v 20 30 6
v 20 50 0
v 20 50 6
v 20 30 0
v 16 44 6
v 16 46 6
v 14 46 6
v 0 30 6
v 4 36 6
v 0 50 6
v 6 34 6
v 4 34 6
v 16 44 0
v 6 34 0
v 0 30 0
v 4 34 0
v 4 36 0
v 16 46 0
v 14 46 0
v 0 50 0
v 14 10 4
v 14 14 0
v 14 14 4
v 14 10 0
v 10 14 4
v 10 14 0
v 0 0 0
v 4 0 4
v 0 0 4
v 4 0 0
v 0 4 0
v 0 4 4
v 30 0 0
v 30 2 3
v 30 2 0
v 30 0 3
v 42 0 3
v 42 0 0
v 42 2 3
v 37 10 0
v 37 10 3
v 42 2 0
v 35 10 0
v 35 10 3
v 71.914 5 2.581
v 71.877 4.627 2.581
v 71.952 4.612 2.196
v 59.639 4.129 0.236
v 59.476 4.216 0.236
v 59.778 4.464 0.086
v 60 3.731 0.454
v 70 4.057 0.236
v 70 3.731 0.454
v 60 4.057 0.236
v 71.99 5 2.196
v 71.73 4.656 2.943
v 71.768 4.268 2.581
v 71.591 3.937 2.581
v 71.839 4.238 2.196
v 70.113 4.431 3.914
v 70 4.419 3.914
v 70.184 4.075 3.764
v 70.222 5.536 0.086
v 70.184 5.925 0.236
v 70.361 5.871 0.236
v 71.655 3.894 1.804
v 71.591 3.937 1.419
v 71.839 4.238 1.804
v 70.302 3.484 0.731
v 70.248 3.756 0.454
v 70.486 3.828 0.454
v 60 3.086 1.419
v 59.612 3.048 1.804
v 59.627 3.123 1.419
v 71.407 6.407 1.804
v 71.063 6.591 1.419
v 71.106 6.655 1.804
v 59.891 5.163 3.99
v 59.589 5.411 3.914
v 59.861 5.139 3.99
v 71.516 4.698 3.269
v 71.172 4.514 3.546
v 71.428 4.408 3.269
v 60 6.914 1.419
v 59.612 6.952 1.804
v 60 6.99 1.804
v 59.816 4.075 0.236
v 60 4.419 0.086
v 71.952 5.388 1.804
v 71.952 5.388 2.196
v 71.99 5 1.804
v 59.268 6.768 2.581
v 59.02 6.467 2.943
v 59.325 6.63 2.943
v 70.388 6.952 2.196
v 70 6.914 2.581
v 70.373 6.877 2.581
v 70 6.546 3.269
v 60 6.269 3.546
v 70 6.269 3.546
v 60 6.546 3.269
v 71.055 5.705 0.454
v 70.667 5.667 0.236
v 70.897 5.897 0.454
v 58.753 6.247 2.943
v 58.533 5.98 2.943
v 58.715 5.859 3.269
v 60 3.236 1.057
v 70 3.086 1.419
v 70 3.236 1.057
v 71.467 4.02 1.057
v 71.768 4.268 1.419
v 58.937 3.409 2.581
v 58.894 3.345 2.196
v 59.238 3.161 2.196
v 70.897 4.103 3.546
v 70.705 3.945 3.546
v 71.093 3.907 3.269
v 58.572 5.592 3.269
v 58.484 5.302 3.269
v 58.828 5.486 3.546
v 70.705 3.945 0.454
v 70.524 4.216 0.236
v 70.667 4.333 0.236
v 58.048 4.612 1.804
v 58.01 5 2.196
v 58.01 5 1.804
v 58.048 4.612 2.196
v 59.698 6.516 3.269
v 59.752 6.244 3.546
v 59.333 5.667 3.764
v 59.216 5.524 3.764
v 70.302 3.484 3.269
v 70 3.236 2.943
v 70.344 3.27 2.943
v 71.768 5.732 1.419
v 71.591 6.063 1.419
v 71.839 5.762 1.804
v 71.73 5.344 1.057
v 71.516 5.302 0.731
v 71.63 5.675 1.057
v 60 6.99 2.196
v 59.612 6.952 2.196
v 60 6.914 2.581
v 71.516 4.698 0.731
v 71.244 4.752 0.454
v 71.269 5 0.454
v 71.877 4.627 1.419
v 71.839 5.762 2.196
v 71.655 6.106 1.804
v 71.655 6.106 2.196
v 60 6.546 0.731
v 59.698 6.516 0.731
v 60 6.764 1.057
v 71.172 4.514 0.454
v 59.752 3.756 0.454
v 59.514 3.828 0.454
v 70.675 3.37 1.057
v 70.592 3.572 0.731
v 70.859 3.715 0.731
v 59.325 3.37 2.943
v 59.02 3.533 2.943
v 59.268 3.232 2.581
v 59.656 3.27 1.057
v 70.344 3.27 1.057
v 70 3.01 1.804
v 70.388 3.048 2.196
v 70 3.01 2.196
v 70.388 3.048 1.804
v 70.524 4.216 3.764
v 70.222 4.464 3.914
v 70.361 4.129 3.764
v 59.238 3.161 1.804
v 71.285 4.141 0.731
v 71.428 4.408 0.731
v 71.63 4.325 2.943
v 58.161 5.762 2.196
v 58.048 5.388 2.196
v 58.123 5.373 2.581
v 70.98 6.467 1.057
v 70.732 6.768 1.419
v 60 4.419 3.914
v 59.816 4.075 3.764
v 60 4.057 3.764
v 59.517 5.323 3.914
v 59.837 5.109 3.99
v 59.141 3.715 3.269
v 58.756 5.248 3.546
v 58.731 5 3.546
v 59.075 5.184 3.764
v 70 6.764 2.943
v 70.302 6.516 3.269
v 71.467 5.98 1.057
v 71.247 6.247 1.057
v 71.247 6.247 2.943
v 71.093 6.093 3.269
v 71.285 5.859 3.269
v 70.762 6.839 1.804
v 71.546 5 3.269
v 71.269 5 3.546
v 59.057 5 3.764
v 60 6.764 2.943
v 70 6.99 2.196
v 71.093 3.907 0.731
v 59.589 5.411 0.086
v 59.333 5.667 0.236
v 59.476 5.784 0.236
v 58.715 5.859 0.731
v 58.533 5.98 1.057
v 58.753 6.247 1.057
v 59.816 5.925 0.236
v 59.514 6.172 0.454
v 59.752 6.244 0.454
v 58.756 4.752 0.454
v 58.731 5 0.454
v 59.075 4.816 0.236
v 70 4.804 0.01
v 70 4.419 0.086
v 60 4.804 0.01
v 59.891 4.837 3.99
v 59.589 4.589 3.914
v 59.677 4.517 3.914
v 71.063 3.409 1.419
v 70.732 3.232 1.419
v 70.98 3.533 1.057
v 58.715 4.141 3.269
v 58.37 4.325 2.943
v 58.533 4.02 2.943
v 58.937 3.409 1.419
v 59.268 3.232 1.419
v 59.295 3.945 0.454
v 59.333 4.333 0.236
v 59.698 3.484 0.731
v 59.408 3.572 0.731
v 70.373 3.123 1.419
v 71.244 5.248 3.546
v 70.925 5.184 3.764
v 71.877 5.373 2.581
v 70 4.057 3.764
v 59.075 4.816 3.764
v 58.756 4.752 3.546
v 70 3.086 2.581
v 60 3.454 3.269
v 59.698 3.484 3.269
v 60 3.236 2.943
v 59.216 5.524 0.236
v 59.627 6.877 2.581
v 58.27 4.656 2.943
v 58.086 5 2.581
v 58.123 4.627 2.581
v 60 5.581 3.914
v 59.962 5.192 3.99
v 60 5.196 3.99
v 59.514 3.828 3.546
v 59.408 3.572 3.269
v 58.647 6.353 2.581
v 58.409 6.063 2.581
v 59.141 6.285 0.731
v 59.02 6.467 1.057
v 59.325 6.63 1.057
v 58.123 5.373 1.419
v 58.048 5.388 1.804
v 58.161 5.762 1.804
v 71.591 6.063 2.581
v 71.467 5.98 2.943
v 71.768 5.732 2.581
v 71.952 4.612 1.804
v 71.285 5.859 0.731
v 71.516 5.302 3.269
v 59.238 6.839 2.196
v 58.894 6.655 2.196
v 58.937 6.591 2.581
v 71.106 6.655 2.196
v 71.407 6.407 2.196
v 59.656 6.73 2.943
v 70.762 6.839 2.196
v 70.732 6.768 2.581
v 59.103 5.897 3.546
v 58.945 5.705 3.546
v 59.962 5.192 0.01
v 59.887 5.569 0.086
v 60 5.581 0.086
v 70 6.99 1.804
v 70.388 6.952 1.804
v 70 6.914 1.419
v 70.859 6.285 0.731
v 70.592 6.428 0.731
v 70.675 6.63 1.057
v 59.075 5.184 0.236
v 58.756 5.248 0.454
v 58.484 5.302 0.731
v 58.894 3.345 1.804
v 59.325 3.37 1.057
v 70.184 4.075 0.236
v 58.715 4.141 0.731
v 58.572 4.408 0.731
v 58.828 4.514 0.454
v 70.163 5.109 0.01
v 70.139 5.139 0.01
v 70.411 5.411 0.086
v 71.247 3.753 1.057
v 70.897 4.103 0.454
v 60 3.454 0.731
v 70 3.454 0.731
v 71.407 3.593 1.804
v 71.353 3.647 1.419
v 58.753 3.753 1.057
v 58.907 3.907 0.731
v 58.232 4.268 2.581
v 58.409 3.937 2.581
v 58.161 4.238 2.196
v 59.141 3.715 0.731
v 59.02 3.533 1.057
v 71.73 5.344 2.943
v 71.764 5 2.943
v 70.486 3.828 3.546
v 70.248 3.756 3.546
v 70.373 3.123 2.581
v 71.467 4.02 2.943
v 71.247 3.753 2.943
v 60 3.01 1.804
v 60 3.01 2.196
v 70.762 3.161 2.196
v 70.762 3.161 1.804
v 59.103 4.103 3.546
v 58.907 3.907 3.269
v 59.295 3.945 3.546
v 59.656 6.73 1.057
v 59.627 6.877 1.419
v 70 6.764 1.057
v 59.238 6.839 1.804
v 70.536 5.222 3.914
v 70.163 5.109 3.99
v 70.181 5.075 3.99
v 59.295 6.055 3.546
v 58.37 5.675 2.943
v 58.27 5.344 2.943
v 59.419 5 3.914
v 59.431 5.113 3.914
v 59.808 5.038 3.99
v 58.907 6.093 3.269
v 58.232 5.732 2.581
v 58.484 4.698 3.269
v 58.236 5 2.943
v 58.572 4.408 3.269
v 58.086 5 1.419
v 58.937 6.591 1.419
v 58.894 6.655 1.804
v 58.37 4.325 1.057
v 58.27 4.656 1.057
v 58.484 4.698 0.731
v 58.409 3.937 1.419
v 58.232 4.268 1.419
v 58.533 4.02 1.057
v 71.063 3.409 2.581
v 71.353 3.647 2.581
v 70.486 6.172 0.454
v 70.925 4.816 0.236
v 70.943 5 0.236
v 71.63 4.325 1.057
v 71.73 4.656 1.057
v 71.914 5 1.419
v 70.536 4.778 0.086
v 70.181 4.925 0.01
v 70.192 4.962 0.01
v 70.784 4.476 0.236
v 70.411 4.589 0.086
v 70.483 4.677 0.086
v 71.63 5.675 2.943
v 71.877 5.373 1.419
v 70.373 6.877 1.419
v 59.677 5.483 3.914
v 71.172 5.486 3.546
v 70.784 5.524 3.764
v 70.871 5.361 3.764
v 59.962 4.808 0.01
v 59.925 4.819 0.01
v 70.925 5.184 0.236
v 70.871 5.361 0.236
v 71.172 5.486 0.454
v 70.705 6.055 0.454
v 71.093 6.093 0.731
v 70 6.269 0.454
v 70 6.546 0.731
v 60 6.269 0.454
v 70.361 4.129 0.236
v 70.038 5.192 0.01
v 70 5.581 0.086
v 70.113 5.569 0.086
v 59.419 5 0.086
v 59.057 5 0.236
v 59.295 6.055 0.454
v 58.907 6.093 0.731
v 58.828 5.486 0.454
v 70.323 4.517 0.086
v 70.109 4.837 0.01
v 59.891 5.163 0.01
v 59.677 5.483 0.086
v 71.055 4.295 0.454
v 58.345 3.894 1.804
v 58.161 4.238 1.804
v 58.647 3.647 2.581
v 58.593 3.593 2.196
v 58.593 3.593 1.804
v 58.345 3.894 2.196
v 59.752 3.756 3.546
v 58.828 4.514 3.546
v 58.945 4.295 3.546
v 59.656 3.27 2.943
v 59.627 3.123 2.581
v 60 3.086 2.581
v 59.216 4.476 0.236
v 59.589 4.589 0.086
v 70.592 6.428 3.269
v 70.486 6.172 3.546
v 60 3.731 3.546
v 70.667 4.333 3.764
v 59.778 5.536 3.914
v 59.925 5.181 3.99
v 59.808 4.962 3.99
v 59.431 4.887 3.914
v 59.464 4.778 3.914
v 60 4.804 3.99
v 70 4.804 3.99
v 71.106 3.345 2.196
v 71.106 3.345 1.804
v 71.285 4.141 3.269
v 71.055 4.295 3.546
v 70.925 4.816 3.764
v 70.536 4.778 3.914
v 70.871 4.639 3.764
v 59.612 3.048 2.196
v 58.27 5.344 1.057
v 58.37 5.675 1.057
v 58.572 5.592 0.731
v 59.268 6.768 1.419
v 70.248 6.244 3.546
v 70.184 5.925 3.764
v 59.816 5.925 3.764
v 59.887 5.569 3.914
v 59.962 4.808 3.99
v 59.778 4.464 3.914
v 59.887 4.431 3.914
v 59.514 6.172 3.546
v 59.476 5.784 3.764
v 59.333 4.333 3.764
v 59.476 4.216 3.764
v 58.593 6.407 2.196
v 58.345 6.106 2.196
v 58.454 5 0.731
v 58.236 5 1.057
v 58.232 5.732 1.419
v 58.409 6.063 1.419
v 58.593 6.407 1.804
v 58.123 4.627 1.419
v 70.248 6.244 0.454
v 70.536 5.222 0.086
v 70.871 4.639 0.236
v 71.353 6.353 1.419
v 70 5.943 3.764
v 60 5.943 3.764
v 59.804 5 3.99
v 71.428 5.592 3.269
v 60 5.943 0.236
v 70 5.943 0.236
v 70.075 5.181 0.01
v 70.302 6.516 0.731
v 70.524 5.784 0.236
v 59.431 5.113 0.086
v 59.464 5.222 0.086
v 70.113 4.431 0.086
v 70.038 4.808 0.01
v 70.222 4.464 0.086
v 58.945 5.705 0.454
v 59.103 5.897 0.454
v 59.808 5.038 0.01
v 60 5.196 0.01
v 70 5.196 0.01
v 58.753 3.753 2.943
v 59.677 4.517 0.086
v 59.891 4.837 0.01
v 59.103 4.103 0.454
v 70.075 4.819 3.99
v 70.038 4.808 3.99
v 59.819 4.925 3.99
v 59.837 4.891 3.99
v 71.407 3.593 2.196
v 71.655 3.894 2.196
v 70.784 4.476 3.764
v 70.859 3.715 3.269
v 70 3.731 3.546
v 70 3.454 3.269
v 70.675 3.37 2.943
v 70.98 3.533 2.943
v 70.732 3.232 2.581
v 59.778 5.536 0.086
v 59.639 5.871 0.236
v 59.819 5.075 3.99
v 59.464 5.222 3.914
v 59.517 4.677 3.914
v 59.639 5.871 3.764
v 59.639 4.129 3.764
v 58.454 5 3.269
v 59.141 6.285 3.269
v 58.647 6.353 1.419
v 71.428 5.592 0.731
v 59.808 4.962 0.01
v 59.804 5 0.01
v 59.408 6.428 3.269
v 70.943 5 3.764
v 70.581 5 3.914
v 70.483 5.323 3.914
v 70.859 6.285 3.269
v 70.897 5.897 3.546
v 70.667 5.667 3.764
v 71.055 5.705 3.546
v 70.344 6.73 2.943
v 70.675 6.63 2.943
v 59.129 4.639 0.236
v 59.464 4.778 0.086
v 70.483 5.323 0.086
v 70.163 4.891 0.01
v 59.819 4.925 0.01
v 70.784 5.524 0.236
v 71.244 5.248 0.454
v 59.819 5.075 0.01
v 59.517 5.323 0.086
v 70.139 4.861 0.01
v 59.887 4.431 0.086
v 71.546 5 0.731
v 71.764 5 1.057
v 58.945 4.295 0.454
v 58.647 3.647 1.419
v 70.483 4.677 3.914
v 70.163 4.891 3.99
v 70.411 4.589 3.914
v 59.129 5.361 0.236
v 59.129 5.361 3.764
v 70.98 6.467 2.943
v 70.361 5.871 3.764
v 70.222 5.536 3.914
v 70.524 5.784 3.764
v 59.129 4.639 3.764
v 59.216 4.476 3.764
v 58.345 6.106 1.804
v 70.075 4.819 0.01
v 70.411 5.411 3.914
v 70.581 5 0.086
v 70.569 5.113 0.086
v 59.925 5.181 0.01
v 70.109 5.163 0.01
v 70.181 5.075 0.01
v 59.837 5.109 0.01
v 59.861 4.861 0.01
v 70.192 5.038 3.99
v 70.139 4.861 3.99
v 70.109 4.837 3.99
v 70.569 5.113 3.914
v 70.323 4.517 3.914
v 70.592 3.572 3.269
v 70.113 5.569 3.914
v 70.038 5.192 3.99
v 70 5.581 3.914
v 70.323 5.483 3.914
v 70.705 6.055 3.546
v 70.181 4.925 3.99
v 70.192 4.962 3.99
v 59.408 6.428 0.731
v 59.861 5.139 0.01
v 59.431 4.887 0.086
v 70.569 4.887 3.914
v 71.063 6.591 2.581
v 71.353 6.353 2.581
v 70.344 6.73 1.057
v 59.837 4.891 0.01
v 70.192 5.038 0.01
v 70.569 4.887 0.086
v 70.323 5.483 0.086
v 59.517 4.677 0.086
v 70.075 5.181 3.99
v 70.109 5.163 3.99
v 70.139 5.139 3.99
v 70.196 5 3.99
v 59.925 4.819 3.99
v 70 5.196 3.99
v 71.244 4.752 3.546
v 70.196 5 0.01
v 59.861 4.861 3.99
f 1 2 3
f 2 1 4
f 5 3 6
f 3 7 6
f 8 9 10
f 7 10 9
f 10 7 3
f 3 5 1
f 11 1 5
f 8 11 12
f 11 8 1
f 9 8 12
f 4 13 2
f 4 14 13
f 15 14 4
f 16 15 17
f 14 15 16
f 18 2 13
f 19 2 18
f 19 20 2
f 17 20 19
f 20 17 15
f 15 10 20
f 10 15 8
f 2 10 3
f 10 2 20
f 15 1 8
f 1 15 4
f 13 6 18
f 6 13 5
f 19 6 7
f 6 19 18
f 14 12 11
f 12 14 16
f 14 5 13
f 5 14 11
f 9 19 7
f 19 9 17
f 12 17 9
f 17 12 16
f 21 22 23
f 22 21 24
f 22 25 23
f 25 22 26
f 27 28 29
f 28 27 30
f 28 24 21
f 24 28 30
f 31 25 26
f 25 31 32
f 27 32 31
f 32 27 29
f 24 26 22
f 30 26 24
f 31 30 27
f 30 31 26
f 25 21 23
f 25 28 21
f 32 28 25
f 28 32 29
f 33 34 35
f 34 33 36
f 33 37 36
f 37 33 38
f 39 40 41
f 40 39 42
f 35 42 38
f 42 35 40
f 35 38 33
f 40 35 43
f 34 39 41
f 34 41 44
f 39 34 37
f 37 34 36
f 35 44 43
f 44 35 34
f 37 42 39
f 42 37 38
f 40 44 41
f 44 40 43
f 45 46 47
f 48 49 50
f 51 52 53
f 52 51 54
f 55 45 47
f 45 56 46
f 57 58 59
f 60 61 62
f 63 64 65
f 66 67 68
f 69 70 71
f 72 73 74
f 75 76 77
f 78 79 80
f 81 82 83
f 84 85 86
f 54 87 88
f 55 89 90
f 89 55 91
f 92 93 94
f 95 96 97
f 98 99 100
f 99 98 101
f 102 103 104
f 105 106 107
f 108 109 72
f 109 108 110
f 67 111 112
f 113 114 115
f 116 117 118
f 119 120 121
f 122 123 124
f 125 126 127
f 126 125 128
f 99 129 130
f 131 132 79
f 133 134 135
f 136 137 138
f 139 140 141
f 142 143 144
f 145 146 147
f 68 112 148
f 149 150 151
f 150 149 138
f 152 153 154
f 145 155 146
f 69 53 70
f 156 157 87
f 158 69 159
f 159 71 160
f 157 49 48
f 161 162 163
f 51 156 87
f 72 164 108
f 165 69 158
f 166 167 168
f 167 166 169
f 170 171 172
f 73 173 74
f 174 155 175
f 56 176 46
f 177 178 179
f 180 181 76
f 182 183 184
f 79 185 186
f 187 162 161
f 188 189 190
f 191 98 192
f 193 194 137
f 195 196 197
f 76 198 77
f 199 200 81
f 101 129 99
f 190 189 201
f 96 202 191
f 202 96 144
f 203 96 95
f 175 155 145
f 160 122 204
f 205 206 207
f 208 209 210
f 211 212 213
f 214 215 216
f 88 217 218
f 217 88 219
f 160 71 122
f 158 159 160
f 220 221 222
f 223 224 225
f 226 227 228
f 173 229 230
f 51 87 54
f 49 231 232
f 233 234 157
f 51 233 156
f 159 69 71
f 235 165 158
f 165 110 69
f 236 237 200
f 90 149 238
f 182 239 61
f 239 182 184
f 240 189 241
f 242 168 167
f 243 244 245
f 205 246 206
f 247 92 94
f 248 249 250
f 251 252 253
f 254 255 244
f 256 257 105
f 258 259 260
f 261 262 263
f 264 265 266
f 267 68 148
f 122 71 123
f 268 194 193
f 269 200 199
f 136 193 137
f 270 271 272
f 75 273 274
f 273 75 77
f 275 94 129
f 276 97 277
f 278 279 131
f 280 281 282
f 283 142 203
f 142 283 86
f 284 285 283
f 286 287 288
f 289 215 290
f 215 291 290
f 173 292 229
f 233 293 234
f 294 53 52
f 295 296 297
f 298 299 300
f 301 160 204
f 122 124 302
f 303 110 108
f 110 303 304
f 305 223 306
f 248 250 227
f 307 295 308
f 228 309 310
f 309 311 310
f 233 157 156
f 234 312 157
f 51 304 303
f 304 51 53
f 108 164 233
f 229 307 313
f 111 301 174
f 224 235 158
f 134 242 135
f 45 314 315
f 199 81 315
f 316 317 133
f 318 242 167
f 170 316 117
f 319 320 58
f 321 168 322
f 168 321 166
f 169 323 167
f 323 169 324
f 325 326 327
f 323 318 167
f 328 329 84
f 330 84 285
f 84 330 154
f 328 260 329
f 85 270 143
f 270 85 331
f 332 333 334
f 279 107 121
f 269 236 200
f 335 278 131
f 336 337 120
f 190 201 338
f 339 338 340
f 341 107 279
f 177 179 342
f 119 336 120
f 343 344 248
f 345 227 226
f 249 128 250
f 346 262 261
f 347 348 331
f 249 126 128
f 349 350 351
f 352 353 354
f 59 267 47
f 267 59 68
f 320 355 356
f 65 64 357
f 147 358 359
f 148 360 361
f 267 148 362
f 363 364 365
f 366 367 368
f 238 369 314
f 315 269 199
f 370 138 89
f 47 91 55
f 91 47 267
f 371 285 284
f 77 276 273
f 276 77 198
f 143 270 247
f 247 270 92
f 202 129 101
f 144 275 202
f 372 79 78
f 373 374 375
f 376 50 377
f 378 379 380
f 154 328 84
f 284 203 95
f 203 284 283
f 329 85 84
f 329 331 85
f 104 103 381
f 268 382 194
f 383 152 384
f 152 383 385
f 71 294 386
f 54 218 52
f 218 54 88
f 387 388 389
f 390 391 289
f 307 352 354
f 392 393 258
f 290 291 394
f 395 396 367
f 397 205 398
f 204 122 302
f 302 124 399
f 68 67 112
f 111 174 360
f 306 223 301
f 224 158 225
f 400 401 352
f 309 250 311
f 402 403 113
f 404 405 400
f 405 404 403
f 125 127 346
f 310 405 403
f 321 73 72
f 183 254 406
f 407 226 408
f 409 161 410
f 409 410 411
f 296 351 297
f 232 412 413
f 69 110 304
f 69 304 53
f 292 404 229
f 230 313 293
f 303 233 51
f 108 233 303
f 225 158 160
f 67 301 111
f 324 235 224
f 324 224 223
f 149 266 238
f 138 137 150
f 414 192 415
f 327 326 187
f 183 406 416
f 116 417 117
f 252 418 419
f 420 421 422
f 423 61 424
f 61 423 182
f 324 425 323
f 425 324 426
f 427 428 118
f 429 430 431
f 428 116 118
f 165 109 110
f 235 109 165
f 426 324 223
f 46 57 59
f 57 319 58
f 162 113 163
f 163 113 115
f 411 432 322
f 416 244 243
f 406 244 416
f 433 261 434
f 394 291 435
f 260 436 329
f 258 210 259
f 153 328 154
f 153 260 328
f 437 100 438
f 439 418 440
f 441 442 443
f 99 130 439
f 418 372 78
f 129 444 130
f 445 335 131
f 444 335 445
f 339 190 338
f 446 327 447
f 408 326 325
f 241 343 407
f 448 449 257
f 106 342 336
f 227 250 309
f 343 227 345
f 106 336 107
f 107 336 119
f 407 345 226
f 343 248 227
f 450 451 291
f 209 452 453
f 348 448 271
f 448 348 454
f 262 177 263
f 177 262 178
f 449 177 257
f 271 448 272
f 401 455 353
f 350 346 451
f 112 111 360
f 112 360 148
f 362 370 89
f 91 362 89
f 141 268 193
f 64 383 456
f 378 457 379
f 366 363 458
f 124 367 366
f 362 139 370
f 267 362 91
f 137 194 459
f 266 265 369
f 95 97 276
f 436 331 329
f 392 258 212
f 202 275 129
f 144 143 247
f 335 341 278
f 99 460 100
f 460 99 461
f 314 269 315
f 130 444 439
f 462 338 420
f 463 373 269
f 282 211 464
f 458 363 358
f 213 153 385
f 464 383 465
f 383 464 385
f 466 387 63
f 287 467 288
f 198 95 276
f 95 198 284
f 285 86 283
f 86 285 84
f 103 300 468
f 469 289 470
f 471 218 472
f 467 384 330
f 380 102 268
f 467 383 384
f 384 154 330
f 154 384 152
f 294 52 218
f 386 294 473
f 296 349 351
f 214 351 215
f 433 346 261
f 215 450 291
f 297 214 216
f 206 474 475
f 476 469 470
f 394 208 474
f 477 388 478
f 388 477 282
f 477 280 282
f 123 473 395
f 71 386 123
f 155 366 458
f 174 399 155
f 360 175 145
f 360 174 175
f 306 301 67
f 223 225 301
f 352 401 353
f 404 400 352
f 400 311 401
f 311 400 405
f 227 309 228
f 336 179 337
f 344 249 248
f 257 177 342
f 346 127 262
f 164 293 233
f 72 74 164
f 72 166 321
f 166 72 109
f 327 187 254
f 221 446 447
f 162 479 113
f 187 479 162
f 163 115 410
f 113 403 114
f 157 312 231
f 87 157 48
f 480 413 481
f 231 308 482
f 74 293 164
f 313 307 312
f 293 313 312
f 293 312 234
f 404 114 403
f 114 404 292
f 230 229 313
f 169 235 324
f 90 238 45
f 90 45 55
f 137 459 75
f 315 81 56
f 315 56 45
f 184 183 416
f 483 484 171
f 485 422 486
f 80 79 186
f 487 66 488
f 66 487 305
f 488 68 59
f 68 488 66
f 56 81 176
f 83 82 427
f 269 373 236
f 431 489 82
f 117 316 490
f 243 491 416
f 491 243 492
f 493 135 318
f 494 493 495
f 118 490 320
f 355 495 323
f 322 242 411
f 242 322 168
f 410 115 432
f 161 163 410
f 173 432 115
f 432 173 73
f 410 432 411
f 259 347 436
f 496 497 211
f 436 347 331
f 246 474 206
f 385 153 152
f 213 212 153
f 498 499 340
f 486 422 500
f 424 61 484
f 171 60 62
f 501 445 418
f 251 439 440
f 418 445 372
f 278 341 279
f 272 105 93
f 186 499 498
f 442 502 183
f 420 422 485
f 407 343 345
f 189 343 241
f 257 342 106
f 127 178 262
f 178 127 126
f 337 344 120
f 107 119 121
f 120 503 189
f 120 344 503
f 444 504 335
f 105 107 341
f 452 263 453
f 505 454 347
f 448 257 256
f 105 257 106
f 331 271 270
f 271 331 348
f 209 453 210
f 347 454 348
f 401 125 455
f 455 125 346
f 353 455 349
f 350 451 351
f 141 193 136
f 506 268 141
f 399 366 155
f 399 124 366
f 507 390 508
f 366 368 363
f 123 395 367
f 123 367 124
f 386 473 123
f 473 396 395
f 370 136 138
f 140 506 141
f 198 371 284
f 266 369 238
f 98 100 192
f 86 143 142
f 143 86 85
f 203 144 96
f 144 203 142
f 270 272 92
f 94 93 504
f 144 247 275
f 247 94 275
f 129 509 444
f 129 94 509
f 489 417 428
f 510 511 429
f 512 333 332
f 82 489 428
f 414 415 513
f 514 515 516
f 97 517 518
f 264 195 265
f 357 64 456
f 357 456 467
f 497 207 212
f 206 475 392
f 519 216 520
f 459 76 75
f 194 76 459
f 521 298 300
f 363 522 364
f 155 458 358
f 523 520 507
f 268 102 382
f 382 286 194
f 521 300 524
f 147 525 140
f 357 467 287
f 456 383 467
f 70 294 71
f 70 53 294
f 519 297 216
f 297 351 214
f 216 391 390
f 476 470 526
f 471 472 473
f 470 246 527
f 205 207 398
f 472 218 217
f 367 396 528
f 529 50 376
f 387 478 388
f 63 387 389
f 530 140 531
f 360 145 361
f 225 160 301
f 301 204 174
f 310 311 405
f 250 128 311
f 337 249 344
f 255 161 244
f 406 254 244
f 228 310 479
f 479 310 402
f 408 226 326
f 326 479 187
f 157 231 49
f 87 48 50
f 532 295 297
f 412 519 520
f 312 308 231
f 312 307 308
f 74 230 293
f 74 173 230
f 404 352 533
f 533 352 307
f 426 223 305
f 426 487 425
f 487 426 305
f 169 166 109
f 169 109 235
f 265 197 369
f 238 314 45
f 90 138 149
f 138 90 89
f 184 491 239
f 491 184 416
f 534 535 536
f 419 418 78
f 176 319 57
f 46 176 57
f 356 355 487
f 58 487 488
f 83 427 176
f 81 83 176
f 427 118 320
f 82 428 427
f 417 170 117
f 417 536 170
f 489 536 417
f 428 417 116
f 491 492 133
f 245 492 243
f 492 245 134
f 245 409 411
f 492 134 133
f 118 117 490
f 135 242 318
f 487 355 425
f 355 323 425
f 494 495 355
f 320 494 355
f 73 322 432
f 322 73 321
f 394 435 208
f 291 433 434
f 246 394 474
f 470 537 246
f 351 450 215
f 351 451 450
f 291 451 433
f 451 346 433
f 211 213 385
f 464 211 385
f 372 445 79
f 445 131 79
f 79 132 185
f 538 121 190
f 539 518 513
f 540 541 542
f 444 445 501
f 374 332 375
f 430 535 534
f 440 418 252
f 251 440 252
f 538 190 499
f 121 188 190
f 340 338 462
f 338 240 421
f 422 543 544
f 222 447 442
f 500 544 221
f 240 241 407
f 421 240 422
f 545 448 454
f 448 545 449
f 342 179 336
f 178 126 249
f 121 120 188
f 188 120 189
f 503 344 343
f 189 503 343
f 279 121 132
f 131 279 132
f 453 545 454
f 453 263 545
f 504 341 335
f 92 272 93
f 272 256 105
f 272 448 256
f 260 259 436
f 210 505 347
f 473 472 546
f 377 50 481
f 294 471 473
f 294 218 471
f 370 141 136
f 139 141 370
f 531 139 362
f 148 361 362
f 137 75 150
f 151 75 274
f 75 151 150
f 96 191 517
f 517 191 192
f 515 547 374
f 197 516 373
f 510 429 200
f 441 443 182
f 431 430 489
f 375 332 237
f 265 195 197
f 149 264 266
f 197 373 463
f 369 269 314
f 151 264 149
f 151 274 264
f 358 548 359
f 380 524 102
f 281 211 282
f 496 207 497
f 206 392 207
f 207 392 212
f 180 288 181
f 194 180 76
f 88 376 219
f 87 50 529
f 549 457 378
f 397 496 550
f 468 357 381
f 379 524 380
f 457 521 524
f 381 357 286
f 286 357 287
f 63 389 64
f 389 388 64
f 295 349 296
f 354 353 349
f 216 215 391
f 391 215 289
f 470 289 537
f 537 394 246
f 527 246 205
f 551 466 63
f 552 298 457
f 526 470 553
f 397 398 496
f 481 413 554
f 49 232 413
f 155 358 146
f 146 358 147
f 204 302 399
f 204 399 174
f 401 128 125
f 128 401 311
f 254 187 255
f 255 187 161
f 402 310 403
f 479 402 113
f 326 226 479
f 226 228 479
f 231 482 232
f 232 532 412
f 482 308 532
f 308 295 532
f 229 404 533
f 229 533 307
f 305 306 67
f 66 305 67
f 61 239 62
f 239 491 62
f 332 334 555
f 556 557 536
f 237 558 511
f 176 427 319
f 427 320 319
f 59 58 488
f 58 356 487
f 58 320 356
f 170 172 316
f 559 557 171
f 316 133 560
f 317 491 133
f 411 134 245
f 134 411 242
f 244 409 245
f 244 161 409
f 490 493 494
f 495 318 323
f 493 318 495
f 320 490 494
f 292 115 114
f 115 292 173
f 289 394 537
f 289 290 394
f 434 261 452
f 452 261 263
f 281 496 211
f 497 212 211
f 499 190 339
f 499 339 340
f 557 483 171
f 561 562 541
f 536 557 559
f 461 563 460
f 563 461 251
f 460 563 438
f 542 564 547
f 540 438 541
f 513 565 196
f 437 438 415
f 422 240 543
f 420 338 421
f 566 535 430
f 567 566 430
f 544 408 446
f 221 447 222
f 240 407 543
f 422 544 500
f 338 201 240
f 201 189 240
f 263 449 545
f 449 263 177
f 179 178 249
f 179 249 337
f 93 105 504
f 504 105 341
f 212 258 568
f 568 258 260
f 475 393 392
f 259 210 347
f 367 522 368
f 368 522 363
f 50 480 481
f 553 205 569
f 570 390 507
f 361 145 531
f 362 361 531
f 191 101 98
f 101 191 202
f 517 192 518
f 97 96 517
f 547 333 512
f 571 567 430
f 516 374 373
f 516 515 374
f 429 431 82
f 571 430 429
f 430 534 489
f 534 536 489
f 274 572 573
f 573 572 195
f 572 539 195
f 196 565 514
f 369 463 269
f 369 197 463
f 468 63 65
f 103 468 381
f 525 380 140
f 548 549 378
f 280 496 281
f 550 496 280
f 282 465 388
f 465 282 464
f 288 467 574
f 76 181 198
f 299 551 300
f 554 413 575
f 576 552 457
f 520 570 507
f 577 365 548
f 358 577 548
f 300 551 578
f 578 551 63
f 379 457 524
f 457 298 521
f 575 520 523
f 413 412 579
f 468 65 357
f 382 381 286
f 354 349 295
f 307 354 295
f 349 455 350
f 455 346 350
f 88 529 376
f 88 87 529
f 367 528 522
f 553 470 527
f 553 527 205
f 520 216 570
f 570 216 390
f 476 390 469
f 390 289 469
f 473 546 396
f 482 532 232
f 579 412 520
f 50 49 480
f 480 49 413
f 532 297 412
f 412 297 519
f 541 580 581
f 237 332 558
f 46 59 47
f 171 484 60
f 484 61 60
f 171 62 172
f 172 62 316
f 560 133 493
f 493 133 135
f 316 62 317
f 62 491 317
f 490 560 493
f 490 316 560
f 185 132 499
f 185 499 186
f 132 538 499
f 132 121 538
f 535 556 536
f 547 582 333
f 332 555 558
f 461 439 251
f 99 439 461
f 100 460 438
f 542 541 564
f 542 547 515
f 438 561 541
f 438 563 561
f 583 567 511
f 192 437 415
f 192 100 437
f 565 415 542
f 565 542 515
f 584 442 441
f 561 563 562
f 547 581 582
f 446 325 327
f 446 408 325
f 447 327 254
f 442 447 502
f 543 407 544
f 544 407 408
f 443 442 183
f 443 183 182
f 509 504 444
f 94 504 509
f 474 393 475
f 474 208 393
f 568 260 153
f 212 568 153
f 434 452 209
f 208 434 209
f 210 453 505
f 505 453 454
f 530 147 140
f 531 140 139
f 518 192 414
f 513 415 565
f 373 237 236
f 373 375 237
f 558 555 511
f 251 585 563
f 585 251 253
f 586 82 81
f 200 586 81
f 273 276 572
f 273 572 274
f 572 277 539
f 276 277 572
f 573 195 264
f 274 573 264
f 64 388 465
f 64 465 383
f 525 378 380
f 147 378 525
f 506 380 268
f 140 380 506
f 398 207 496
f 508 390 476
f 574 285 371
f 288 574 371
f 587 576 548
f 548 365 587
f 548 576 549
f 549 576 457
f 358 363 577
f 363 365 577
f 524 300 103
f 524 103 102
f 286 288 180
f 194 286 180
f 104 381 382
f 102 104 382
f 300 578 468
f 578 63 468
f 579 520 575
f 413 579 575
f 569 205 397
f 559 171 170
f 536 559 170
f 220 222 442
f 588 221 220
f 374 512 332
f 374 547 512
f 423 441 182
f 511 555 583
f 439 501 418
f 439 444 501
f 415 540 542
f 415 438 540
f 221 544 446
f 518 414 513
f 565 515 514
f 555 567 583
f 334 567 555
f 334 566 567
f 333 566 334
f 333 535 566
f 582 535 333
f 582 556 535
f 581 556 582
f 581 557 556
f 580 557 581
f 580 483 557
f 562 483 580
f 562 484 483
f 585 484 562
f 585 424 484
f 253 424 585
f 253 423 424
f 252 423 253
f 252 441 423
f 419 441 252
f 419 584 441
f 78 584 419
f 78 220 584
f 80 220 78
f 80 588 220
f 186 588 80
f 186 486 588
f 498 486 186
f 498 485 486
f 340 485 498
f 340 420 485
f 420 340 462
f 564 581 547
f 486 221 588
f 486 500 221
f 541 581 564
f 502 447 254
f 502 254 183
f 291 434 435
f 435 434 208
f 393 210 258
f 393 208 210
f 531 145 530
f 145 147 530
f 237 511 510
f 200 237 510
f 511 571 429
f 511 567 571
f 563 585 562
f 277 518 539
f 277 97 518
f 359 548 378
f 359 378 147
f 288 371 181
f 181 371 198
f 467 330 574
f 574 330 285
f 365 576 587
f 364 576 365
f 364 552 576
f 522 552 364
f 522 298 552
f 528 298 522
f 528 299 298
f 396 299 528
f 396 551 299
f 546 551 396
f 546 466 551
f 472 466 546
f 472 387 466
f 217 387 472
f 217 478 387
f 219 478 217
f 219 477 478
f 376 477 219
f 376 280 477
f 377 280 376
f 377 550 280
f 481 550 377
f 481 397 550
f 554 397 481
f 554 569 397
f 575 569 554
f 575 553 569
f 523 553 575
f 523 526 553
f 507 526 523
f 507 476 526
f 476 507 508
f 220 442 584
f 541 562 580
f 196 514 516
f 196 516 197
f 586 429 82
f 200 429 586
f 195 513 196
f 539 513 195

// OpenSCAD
// Original CanvasNet test fixture: hull() of 3D parts, of 2D shapes and as a boolean operand.
$fn = 32;

// A six-sided prism: the hull of two 4 x 4 x 4 cubes at opposite corners of a 14 x 14 square, 4 tall.
// Its outline is (0,0) (4,0) (14,10) (14,14) (10,14) (0,4).
hull() { cube(4); translate([10, 10, 0]) cube(4); }

// A 2D hull extruded 3 tall: the hull of three 2 x 2 squares, outline (0,0) (12,0) (12,2) (7,10) (5,10) (0,2),
// moved to x 30..42.
translate([30, 0, 0]) linear_extrude(height = 3)
  hull() { square(2); translate([10, 0]) square(2); translate([5, 8]) square(2); }

// A capsule: the hull of two spheres of radius 2 with their centers 10 apart along X, centered at (65, 5)
translate([60, 5, 2]) hull() { sphere(r = 2); translate([10, 0, 0]) sphere(r = 2); }

// A block with a diagonal slot cut by a hull: the slot is the hull of two 2 x 2 pillars, cut through the 6 tall
// block (20 x 20 at x 0..20, y 30..50); its outline is (4,4) (6,4) (16,14) (16,16) (14,16) (4,6) in block coordinates
translate([0, 30, 0])
  difference() {
    cube([20, 20, 6]);
    translate([4, 4, -1]) hull() { cube([2, 2, 8]); translate([10, 10, 0]) cube([2, 2, 8]); }
  }
